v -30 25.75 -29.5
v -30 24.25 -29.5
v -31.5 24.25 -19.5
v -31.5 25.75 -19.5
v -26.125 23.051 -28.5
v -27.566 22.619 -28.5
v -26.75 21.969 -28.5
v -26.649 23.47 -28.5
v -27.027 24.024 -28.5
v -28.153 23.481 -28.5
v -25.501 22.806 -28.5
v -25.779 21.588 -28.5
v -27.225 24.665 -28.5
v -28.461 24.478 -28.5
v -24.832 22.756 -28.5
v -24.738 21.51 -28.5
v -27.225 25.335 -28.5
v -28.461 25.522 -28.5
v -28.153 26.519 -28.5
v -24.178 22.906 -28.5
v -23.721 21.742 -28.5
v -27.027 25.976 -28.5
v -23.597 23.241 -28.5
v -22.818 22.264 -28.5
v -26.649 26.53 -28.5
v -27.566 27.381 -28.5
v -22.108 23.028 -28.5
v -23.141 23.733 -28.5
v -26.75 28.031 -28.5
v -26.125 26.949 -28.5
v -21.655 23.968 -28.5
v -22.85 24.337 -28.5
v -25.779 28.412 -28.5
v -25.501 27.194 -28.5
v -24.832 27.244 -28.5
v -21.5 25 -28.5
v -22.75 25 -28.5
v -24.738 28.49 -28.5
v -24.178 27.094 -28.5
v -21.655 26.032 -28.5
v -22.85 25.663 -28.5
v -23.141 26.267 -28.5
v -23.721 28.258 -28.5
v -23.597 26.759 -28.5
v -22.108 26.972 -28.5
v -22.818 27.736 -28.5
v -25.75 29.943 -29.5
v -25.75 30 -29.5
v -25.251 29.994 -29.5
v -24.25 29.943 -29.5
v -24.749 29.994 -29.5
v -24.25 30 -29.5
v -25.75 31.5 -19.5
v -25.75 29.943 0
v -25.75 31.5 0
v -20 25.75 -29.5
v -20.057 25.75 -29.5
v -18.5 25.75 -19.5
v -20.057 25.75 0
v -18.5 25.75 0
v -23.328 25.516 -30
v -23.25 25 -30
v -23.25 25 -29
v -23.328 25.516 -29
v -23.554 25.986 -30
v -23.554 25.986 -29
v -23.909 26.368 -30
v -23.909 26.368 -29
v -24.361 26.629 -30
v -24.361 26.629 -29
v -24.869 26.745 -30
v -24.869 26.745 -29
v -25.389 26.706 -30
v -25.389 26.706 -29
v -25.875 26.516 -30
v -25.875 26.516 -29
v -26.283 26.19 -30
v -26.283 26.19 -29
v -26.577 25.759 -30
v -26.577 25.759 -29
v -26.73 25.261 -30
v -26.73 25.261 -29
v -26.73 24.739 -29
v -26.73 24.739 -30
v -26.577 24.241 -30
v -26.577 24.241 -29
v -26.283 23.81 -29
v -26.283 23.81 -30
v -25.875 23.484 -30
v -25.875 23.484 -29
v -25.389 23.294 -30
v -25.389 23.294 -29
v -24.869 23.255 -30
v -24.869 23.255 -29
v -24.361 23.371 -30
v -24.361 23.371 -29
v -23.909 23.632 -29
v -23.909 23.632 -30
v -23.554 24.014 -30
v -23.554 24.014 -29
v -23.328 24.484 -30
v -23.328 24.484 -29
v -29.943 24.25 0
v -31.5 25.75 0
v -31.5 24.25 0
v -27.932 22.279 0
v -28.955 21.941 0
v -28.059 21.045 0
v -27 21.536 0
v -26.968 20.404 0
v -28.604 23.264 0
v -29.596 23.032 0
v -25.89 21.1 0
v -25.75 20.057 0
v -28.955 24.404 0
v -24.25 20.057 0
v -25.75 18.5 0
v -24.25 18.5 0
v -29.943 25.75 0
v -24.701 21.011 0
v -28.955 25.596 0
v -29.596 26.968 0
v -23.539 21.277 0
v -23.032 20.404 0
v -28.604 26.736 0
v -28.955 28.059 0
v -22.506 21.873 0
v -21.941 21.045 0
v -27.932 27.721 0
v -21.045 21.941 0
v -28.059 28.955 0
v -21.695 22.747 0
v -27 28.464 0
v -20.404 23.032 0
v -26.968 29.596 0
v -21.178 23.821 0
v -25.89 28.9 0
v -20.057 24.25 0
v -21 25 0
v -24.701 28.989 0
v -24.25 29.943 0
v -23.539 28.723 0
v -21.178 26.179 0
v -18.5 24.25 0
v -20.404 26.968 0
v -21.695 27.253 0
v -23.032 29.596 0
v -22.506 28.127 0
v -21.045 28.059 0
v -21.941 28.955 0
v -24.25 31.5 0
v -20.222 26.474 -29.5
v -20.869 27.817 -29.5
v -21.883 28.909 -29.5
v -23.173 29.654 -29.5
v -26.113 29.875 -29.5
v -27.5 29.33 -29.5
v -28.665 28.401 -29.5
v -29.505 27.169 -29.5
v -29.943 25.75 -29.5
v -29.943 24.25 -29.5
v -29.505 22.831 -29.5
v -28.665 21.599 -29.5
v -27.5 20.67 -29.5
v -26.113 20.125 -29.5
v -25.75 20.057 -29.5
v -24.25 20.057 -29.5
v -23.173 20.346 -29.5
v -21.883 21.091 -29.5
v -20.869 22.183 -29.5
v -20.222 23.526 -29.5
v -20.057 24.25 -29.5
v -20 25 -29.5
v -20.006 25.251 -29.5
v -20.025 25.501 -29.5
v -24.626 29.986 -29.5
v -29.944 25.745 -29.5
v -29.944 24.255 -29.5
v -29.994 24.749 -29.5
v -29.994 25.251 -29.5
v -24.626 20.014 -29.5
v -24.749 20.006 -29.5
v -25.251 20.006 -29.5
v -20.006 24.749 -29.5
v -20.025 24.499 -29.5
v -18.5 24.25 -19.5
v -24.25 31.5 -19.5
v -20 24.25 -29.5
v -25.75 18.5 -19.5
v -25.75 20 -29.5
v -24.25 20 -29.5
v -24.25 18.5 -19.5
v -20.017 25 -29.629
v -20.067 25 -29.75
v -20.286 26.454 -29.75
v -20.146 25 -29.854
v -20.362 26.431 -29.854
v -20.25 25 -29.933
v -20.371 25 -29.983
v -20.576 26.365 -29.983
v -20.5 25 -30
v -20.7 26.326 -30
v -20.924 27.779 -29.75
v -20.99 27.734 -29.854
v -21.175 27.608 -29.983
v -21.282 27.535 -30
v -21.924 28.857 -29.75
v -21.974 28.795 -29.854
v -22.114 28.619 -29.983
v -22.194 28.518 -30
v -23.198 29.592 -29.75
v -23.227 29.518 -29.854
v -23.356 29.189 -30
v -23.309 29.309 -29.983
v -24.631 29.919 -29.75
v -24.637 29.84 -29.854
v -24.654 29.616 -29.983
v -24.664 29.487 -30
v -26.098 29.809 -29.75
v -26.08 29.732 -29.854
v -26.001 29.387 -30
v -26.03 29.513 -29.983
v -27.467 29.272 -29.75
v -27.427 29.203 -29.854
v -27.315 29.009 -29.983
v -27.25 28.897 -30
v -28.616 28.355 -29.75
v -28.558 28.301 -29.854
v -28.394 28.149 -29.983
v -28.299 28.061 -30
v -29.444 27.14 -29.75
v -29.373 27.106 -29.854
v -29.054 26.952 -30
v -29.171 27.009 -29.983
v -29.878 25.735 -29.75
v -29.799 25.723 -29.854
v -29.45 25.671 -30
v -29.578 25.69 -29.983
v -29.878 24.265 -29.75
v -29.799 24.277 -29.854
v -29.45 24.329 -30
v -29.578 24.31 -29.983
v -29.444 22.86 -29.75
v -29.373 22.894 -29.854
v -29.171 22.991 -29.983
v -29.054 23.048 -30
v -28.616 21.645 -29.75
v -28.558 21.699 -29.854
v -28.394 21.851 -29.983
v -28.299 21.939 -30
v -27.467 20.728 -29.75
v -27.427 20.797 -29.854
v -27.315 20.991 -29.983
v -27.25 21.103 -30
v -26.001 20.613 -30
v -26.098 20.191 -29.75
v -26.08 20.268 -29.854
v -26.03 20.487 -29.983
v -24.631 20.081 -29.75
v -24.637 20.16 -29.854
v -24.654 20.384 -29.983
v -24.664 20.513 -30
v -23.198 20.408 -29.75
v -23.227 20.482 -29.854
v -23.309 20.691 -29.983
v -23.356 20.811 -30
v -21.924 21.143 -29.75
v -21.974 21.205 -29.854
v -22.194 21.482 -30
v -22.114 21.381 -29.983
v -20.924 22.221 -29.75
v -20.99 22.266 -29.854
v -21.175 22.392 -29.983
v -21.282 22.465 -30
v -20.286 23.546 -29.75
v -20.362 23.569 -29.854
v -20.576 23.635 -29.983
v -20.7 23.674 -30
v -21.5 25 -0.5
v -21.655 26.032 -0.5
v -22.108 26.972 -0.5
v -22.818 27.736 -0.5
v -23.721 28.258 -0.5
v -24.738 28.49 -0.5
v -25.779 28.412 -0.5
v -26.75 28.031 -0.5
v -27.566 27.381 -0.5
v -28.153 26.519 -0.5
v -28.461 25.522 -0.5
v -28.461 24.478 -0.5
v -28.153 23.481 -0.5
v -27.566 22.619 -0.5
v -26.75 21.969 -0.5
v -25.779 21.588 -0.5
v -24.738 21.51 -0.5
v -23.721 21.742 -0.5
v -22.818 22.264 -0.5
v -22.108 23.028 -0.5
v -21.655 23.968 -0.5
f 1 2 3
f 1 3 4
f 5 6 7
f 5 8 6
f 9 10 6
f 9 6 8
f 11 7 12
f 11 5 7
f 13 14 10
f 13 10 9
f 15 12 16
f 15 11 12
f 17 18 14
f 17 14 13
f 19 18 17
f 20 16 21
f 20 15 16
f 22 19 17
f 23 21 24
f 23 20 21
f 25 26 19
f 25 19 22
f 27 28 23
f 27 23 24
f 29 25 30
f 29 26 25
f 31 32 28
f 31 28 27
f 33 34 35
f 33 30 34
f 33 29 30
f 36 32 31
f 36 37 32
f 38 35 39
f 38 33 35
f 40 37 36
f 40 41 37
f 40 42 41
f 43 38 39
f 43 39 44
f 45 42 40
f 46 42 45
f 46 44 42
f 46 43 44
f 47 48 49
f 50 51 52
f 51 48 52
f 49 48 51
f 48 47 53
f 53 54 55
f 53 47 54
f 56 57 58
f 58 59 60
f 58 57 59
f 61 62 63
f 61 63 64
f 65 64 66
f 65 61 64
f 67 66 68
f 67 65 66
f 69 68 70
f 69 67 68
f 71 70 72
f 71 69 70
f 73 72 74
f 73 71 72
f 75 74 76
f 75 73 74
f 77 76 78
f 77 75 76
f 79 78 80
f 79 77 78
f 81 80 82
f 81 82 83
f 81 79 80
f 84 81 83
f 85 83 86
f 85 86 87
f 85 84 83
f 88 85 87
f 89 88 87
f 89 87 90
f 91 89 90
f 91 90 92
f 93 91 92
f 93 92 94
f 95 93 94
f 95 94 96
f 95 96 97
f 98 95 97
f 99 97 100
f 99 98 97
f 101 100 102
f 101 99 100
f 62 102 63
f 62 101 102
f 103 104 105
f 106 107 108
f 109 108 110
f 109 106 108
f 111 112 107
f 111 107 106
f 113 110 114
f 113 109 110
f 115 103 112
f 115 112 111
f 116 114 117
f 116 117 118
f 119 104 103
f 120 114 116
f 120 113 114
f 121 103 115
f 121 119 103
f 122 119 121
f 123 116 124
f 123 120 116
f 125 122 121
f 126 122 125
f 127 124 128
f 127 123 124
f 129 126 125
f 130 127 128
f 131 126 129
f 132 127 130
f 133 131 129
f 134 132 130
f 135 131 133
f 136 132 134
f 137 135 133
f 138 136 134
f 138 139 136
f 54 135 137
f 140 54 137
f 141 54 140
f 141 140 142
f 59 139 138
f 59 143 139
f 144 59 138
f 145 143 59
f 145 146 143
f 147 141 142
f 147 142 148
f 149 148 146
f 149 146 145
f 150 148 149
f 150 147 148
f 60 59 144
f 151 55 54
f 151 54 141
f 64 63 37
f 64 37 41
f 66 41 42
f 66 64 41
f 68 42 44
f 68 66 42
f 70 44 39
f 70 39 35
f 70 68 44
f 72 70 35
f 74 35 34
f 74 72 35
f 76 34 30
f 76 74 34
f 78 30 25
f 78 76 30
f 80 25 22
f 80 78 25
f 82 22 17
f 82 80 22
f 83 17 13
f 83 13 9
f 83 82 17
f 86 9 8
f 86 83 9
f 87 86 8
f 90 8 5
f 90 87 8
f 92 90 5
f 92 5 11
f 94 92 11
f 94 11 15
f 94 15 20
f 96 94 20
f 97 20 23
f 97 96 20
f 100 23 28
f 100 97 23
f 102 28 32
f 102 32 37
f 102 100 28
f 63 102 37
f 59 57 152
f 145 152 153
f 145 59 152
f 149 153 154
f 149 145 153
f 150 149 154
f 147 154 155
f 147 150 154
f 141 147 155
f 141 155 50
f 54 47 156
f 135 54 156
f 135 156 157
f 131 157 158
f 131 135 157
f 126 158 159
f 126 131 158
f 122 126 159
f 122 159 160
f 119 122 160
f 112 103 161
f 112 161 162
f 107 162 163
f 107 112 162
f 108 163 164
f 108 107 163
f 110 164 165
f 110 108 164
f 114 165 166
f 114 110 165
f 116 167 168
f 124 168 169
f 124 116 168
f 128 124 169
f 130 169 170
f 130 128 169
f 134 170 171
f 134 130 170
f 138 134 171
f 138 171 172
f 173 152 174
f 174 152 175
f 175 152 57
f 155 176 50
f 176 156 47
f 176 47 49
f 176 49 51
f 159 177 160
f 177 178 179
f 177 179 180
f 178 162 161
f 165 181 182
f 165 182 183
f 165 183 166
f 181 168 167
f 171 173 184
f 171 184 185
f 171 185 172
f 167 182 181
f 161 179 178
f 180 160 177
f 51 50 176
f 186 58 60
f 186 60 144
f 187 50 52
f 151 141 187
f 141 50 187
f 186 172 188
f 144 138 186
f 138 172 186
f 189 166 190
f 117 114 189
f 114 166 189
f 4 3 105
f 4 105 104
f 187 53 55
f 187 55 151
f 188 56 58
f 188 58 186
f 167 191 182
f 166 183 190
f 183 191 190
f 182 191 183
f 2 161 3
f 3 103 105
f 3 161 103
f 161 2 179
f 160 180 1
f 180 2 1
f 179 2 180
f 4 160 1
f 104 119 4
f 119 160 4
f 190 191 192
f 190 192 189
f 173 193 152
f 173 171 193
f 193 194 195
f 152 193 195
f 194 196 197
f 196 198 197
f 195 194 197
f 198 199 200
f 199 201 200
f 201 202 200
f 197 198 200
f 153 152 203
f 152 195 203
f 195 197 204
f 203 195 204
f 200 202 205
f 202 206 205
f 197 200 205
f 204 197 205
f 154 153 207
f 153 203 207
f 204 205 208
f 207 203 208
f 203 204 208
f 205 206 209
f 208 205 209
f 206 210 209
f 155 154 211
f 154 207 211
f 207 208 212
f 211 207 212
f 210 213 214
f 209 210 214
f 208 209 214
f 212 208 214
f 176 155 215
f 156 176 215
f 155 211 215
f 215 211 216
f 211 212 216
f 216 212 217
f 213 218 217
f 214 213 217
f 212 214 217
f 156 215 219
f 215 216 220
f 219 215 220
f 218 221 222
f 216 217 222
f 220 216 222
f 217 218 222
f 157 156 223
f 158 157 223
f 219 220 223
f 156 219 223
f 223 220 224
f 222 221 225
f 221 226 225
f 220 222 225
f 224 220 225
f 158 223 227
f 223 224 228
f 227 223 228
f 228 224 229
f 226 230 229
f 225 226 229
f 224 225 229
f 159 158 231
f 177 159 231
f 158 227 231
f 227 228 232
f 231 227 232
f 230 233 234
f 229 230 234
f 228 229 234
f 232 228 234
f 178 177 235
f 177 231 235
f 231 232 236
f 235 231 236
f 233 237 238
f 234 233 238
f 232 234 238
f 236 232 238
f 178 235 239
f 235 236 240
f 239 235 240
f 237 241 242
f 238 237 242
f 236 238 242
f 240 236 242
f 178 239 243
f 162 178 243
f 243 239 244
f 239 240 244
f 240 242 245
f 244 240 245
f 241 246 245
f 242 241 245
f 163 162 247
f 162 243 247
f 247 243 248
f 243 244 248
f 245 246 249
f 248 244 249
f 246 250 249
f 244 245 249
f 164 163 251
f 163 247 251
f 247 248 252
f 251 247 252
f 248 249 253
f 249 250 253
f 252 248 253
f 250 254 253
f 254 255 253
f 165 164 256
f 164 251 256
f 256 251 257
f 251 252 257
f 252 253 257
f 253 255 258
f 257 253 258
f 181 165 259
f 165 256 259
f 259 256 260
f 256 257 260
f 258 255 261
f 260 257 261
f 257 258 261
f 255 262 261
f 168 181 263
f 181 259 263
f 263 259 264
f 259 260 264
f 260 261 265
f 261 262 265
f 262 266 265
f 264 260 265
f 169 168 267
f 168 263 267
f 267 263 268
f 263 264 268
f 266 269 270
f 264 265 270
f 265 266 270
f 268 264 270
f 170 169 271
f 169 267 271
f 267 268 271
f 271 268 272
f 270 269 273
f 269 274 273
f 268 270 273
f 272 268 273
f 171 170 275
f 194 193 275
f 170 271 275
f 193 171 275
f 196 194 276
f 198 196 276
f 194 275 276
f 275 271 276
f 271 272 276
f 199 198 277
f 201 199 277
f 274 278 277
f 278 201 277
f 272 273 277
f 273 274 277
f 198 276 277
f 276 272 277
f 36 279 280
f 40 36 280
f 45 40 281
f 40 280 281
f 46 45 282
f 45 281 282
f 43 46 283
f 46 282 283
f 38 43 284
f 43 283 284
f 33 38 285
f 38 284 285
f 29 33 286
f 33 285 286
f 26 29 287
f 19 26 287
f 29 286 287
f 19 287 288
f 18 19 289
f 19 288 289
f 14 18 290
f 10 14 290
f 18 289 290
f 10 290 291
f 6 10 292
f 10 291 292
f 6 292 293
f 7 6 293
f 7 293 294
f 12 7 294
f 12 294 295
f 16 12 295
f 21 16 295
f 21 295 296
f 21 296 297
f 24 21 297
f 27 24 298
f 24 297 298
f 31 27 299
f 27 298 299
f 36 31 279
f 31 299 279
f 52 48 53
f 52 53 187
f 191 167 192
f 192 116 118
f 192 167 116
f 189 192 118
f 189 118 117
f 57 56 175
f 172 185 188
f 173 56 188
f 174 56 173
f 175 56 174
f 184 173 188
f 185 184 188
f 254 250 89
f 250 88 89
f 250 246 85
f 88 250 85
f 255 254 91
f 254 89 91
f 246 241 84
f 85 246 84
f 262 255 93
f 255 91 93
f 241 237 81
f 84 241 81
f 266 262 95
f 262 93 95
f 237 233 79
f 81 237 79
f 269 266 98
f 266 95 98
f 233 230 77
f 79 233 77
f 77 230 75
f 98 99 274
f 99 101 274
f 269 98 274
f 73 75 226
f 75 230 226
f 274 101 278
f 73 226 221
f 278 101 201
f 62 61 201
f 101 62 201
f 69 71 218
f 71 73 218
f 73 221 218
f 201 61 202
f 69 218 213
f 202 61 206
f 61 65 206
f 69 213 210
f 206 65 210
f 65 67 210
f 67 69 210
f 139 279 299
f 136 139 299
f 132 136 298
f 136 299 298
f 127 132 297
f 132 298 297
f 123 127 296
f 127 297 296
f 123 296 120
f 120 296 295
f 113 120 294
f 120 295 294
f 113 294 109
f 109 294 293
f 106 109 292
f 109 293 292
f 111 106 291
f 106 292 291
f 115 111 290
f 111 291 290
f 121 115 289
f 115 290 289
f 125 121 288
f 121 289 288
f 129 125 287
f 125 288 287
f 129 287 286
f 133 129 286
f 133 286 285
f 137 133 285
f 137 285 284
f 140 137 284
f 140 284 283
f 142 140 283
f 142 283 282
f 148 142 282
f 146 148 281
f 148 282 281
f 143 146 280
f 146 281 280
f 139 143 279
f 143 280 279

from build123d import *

# Parameters (mm, degrees)
F1_R        = 5
F1_R_2      = 3.5
F2_DEPTH    = 30
F4_W        = 1.5
F4_H        = 2.639524132
F5_DEPTH    = 29.5
F6_COUNT    = 4
F8_R        = 3.5
F8_R_2      = 1.75
F9_DEPTH    = 1.5
F10_SIZE2   = 1.49999
F10_SIZE    = 9.99999
F10_2_SIZE2 = 1.49999
F10_2_SIZE  = 9.99999
F10_3_SIZE2 = 1.49999
F10_3_SIZE  = 9.99999
F10_4_SIZE2 = 1.49999
F10_4_SIZE  = 9.99999
F11_SIZE    = 0.5
F12_R       = 0.49999


# Not quite as in the source:
# - a fillet or chamfer is up to 0.001 mm smaller than in the source, because OpenCascade refuses the exact size


with BuildPart() as f2:
    # F1 (on offset) → F2 (new body)
    with BuildSketch(Plane.XY):
        with Locations((-25, 25)):
            Circle(F1_R)
        with Locations((-25, 25)):
            Circle(F1_R_2, mode=Mode.SUBTRACT)
    extrude(amount=-F2_DEPTH)

    # F4 (on offset) → F5 (join)
    with BuildSketch(Plane.XY):
        with Locations((-25, 30.180237934)):
            Rectangle(F4_W, F4_H)
    extrude(amount=-F5_DEPTH)

    # F6: F2 ×4 about axis
    f6_axis = Axis((-25, 25, 0), (0, 0, 1))


with BuildPart() as f2_1:
    add(f2.part)
    for i in range(1, F6_COUNT):
        add(f2.part.rotate(f6_axis, i * 360 / F6_COUNT))

    # F8 (on offset) → F9 (join)
    with BuildSketch(Plane.XY.offset(-30)):
        with Locations((-25, 25)):
            Circle(F8_R)
        with Locations((-25, 25)):
            Circle(F8_R_2, mode=Mode.SUBTRACT)
    extrude(amount=F9_DEPTH)

    # F10 (size 10 and 1.5 in the source; OpenCascade refuses exactly that, so slightly less here)
    f10_edges = [f2_1.edges().sort_by_distance(p)[0] for p in [
        (-25, 18.5, -29.5),
    ]]
    f10_side = f2_1.faces().sort_by_distance((-25, 18.5, -14.75))[0]
    chamfer(f10_edges, length=F10_SIZE, length2=F10_SIZE2, reference=f10_side)

    # F10#2 (size 10 and 1.5 in the source; OpenCascade refuses exactly that, so slightly less here)
    f10_2_edges = [f2_1.edges().sort_by_distance(p)[0] for p in [
        (-18.5, 25, -29.5),
    ]]
    f10_2_side = f2_1.faces().sort_by_distance((-18.5, 25, -14.75))[0]
    chamfer(f10_2_edges, length=F10_2_SIZE, length2=F10_2_SIZE2, reference=f10_2_side)

    # F10#3 (size 10 and 1.5 in the source; OpenCascade refuses exactly that, so slightly less here)
    f10_3_edges = [f2_1.edges().sort_by_distance(p)[0] for p in [
        (-25, 31.5, -29.5),
    ]]
    f10_3_side = f2_1.faces().sort_by_distance((-25, 31.5, -14.75))[0]
    chamfer(f10_3_edges, length=F10_3_SIZE, length2=F10_3_SIZE2, reference=f10_3_side)

    # F10#4 (size 10 and 1.5 in the source; OpenCascade refuses exactly that, so slightly less here)
    f10_4_edges = [f2_1.edges().sort_by_distance(p)[0] for p in [
        (-31.5, 25, -29.5),
    ]]
    f10_4_side = f2_1.faces().sort_by_distance((-31.5, 25, -14.75))[0]
    chamfer(f10_4_edges, length=F10_4_SIZE, length2=F10_4_SIZE2, reference=f10_4_side)

    # F11
    f11_edges = [f2_1.edges().sort_by_distance(p)[0] for p in [
        (-28.5, 25, 0),
        (-26.75, 25, -28.5),
    ]]
    chamfer(f11_edges, length=F11_SIZE)

    # F12 (radius 0.5 in the source; OpenCascade refuses exactly that, so slightly less here)
    f12_edges = [f2_1.edges().sort_by_distance(p)[0] for p in [
        (-30, 25, -30),
    ]]
    fillet(f12_edges, radius=F12_R)


solid = f2_1.part
